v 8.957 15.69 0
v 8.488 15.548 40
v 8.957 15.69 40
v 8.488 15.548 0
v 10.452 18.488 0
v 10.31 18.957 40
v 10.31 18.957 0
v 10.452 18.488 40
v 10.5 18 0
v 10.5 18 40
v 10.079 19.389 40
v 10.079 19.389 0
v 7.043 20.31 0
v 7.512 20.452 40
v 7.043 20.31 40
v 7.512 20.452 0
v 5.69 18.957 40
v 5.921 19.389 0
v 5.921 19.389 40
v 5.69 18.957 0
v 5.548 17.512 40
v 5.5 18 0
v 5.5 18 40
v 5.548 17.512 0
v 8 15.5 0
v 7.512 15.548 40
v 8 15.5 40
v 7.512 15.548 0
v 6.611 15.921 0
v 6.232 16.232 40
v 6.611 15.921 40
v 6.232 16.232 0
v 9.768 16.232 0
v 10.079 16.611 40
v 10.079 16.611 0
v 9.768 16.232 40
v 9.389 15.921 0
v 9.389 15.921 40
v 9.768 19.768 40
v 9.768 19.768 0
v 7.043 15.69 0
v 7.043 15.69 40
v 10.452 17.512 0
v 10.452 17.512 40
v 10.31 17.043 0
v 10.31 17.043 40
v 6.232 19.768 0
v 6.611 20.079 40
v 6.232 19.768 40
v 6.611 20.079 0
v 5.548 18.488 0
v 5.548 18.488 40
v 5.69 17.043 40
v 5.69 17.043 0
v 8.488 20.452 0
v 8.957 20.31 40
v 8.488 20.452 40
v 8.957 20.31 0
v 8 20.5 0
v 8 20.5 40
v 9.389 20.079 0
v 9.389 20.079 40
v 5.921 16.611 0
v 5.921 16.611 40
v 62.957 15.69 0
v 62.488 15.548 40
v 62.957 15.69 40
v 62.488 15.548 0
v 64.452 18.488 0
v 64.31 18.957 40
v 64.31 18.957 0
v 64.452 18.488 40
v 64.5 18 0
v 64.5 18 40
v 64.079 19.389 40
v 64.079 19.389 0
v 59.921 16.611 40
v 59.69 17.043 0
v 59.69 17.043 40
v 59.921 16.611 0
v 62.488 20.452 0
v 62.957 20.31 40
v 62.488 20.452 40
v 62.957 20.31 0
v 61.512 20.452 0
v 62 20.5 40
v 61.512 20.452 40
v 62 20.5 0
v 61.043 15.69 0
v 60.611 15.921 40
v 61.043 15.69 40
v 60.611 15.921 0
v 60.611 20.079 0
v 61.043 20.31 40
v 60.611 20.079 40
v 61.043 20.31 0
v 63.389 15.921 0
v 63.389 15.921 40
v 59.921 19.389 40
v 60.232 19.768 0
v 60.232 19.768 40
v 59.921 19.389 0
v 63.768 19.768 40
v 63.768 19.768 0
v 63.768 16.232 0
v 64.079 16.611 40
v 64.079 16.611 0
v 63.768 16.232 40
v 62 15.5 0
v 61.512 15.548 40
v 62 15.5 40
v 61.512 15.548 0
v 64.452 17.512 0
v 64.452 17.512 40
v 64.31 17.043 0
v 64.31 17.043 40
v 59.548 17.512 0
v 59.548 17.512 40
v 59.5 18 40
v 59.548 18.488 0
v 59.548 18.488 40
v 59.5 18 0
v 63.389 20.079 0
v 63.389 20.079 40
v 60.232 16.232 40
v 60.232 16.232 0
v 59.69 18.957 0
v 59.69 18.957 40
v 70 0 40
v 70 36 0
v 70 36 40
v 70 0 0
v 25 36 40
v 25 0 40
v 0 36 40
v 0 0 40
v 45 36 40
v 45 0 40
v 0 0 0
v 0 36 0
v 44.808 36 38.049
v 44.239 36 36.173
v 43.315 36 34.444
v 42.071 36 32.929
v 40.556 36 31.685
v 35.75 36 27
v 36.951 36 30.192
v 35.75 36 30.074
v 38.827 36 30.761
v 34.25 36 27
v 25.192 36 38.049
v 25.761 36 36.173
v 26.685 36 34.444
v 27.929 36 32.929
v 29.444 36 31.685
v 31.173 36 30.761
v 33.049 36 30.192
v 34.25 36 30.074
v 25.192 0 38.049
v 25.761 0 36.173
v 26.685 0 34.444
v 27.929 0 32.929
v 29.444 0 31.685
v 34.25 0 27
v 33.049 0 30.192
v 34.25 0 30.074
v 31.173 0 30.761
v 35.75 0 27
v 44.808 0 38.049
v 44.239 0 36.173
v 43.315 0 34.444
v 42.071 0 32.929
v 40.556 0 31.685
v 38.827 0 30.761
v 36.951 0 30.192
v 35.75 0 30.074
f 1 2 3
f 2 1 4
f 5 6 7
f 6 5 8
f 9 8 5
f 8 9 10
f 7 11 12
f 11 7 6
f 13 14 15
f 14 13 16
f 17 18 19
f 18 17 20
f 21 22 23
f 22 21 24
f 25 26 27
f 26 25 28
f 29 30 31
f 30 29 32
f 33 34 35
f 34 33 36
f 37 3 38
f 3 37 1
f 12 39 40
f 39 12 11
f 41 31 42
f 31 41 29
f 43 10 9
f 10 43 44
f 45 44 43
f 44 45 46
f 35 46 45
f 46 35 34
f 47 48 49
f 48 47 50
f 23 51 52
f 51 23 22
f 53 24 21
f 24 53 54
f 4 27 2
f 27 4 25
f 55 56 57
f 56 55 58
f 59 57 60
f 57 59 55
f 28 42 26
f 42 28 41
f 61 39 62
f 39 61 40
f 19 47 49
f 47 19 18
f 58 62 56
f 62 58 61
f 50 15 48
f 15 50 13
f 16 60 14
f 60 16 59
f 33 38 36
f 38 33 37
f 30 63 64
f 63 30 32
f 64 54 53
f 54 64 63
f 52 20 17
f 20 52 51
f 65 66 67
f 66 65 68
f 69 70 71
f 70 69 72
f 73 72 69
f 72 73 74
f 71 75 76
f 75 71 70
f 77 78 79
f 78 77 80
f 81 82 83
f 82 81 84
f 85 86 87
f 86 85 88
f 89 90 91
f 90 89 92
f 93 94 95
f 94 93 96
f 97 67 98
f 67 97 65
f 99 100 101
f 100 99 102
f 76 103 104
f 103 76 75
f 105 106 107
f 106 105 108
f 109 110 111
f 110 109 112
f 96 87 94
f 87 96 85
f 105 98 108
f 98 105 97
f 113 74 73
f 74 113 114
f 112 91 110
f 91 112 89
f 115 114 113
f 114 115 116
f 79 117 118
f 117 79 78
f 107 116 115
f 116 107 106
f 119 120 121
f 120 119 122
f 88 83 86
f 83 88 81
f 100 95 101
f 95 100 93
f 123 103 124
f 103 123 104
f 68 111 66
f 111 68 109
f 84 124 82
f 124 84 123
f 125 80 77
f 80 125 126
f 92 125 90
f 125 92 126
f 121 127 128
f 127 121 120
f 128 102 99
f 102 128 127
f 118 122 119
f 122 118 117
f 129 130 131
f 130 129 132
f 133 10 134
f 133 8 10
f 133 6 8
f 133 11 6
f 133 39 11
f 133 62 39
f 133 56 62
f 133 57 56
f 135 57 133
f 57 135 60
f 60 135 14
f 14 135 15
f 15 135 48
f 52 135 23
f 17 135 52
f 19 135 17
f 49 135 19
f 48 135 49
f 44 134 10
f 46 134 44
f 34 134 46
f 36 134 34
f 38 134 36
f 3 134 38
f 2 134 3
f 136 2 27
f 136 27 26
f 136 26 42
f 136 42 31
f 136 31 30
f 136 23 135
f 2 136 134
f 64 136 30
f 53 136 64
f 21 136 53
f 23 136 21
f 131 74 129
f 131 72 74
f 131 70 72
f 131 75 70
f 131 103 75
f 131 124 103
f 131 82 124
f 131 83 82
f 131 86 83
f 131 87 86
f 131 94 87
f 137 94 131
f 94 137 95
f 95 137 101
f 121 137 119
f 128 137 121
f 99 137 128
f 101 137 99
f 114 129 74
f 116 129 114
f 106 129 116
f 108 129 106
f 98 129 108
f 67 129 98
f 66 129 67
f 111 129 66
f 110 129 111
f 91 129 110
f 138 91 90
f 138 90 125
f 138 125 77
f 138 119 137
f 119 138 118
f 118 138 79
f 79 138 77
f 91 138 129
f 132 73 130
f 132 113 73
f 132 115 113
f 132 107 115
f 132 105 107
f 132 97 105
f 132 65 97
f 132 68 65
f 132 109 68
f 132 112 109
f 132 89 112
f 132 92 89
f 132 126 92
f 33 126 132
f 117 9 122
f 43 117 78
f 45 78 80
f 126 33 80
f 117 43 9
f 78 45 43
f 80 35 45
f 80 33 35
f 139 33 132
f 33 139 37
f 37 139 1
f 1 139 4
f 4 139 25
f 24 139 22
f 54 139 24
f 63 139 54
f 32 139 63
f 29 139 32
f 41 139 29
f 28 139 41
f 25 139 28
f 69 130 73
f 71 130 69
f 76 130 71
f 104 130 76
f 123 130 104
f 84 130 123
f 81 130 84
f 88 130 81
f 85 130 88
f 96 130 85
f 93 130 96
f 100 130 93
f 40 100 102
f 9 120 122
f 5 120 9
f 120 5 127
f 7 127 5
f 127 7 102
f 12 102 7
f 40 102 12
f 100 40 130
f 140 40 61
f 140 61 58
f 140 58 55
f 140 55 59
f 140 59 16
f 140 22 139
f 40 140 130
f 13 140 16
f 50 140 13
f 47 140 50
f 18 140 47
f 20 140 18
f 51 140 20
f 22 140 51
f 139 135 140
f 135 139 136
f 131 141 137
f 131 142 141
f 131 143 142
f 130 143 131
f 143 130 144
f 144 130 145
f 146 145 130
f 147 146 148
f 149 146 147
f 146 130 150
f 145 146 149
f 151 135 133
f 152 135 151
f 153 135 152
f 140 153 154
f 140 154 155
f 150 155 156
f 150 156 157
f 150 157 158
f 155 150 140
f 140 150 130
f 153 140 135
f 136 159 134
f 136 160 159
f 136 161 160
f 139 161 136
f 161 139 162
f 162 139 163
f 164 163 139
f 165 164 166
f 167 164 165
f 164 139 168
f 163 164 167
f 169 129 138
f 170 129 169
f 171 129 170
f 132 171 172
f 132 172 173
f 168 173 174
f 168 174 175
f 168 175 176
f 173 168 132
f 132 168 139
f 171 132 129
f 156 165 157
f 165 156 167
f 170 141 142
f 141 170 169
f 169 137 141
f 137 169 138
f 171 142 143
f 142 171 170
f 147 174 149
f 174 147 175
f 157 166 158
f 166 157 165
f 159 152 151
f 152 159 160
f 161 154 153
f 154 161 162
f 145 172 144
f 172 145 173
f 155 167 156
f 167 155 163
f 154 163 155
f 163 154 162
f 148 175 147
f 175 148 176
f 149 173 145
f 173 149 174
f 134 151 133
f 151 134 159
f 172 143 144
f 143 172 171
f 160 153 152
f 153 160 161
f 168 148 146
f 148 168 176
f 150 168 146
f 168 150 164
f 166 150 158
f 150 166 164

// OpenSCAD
$fn = 32;

// ----------------------------------------------------------------------
// Saddle clamp: split shaft clamp
// ----------------------------------------------------------------------

// --- parameters (mm) ---
blk_l = 70;               // block length, X
blk_w = 36;               // block width, Y
blk_h = 40;               // block height
clamp_r = 10;             // shaft groove radius
hole_r = 2.5;             // bolt hole radius
hole_m = 8;               // bolt hole margin from the ends
saw_w = 1.5;              // saw kerf width

saw_depth = clamp_r + 3;  // saw kerf depth

difference() {
  cube([blk_l, blk_w, blk_h]);
  translate([blk_l / 2, -1, blk_h])
    rotate([-90, 0, 0])
      cylinder(h = blk_w + 2, r = clamp_r);
  for (sx = [0, 1])
    translate([sx ? blk_l - hole_m : hole_m, blk_w / 2, -1])
      cylinder(r = hole_r, h = blk_h + 2);
  translate([blk_l / 2 - saw_w / 2, -1, blk_h - saw_depth])
    cube([saw_w, blk_w + 2, saw_depth + 1]);
}
